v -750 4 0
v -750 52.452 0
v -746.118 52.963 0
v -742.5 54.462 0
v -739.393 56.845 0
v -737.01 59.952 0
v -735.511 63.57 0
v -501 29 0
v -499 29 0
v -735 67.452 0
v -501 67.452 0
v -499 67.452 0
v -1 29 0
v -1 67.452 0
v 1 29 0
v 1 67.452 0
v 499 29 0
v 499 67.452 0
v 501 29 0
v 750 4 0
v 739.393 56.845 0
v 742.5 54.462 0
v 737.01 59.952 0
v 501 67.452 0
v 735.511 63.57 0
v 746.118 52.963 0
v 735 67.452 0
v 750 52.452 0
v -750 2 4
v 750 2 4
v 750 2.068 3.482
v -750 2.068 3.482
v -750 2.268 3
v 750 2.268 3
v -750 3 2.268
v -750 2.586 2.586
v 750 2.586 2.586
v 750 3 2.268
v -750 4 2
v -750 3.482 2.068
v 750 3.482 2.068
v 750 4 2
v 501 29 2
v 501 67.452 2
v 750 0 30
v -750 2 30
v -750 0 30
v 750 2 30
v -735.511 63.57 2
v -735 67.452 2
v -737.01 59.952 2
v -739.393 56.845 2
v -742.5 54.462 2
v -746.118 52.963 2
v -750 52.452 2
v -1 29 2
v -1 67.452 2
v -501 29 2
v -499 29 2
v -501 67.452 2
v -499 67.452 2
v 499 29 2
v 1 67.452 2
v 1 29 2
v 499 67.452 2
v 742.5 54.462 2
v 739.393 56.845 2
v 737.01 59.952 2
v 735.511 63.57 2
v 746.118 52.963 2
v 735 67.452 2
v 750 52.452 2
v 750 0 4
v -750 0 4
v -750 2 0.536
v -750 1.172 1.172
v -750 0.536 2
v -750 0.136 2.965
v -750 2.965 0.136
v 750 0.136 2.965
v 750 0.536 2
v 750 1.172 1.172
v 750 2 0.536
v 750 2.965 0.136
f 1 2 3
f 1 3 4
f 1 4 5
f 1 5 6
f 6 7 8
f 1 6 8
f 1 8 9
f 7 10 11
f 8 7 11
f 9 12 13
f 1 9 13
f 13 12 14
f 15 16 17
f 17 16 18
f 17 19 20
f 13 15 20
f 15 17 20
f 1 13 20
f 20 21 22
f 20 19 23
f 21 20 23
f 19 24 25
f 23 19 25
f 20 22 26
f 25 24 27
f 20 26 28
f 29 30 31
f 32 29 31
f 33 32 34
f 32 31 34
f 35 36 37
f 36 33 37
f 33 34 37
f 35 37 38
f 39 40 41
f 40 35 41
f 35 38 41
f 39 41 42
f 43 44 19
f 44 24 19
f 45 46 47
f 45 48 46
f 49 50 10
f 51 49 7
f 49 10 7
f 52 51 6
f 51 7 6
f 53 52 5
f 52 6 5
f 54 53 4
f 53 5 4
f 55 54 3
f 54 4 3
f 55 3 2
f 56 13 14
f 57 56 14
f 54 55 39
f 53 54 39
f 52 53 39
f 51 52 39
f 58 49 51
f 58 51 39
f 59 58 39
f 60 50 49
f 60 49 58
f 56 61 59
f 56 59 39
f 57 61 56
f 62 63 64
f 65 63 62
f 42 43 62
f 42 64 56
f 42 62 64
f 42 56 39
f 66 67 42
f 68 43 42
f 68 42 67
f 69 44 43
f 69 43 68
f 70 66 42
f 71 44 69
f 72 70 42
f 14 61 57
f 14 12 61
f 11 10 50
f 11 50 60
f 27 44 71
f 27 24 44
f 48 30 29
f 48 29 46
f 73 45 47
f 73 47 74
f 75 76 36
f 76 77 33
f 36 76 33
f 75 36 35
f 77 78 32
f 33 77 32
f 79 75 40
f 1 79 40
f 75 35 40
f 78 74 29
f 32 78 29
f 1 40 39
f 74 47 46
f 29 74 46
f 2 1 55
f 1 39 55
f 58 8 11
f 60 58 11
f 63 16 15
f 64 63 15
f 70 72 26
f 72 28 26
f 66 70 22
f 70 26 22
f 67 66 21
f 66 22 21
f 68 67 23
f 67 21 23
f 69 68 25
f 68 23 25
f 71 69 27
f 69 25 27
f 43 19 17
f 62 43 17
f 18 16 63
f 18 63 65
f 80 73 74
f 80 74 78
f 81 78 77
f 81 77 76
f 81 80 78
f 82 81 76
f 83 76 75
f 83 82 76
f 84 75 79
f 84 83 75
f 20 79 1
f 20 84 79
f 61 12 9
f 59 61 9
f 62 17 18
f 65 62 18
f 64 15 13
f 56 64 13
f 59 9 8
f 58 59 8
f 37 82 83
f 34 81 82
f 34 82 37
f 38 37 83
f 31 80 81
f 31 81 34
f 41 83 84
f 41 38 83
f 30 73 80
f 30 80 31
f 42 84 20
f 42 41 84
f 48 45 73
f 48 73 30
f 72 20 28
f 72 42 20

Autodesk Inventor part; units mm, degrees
ref_plane "YZ Plane" through (0, 0, 0) normal (1, 0, 0) x (0, 1, 0)
ref_plane "XZ Plane" through (0, 0, 0) normal (0, 1, 0) x (-1, 0, 0)
ref_plane "XY Plane" through (0, 0, 0) normal (0, 0, 1) x (1, 0, 0)
sketch "Sketch1" plane through (0, 0, 0) normal (0, 0, 1) x (1, 0, 0)
  line L0 (-750, 67.4521) -> (750, 67.4521)
  line L1 (750, 67.4521) -> (750, 0)
  line L2 (750, 0) -> (-750, 0)
  line L3 (-750, 0) -> (-750, 67.4521)
  point P0 (0, 0)
  point P1 (0, 0)
  dimension "d0" = 1500
  dimension "d1" = 67.4521
extrude "Plate1" add sketch "Sketch1" along normal blind 2
sketch "Sketch2" plane through (750, 2, 0) normal (0, -1, 0) x (1, 0, 0)
  line L0 (-1500, 0) -> (0, 0)
  line L1 (0, 0) -> (0, 30)
  line L2 (0, 30) -> (-1500, 30)
  line L3 (-1500, 30) -> (-1500, 0)
edge flange "Flange1" height 30 angle 90 thickness 2 bend radius 2 thickness toward (0, -1, 0) relief tear relief width 2 relief depth 1 edges at (0, 0, 2) wall of the first edge with corners at (-750, 2, 0) (750, 2, 0) (750, 2, 30) (-750, 2, 30)
bend "Bend1"
corner "Corner1"
sketch "Sketch5" plane through (0, 0, 0) normal (0, 0, -1) x (-1, 0, 0)
  line L0 (750, 67.4521) -> (-750, 67.4521) projected
  line L1 (499, 67.4521) -> (499, 29)
  line L2 (499, 29) -> (501, 29)
  line L3 (501, 29) -> (501, 67.4521)
  line L4 (750, 0) -> (-750, 0) projected
  point P0 (0, 0)
  point P1 (500, 29)
  dimension "d18" = 2
  dimension "d20" = 29
  dimension "d27" = 250
extrude "Extrusion1" cut sketch "Sketch5" against normal through all
pattern_linear "Rectangular Pattern1" count 3 spacing 500 along (1, 0, 0) of "Extrusion1"
sketch "Sketch6" plane through (0, 0, 0) normal (0, 0, -1) x (-1, 0, 0)
  line L0 (-750, 67.4521) -> (-750, 4) projected
  circle A0 centre (-750, 67.4521) radius 15
  line L1 (-750, 67.4521) -> (-501, 67.4521) projected
  point P0 (0, 0)
  point P1 (-735, 67.4521)
  point P2 (-750, 52.4521)
  dimension "d24" = 30
extrude "Extrusion2" cut sketch "Sketch6" against normal through all contours L1 A0 L0 picked at (-740.1254, 66.3395)
mirror "Mirror1" about plane through (0, 0, 0) normal (1, 0, 0) of "Extrusion2"
equation "\"d1\" = Стрингер_2"
equation "\"d18\" = Thickness"
equation "\"d2\" = Thickness"
equation "\"d3\" = BendReliefWidth"
equation "\"d4\" = BendReliefDepth"
equation "\"d5\" = MinimumRemnant"
equation "\"d6\" = TransitionRadius"
equation "\"d9\" = BendRadius"
equation "\"d10\" = CornerReliefSize"
equation "\"d11\" = GapSize"
equation "\"d12\" = JacobiRadiusSize"
equation "\"BendRadius\" = Thickness"
equation "\"BendReliefWidth\" = Thickness"
equation "\"BendReliefDepth\" = 0.5 * Thickness"
equation "\"CornerReliefSize\" = 4 * Thickness"
equation "\"MinimumRemnant\" = 2 * Thickness"
equation "\"TransitionRadius\" = BendRadius"
equation "\"JacobiRadiusSize\" = BendRadius"
equation "\"GapSize\" = Thickness"
equation "\"qqqqqq\" = 67.35706"
equation "\"Стрингер_2\" = 67.452127"
equation "\"Thickness\" = 2"
properties part number "МОО 052 стрингер спина 21" material "Stainless Steel"
